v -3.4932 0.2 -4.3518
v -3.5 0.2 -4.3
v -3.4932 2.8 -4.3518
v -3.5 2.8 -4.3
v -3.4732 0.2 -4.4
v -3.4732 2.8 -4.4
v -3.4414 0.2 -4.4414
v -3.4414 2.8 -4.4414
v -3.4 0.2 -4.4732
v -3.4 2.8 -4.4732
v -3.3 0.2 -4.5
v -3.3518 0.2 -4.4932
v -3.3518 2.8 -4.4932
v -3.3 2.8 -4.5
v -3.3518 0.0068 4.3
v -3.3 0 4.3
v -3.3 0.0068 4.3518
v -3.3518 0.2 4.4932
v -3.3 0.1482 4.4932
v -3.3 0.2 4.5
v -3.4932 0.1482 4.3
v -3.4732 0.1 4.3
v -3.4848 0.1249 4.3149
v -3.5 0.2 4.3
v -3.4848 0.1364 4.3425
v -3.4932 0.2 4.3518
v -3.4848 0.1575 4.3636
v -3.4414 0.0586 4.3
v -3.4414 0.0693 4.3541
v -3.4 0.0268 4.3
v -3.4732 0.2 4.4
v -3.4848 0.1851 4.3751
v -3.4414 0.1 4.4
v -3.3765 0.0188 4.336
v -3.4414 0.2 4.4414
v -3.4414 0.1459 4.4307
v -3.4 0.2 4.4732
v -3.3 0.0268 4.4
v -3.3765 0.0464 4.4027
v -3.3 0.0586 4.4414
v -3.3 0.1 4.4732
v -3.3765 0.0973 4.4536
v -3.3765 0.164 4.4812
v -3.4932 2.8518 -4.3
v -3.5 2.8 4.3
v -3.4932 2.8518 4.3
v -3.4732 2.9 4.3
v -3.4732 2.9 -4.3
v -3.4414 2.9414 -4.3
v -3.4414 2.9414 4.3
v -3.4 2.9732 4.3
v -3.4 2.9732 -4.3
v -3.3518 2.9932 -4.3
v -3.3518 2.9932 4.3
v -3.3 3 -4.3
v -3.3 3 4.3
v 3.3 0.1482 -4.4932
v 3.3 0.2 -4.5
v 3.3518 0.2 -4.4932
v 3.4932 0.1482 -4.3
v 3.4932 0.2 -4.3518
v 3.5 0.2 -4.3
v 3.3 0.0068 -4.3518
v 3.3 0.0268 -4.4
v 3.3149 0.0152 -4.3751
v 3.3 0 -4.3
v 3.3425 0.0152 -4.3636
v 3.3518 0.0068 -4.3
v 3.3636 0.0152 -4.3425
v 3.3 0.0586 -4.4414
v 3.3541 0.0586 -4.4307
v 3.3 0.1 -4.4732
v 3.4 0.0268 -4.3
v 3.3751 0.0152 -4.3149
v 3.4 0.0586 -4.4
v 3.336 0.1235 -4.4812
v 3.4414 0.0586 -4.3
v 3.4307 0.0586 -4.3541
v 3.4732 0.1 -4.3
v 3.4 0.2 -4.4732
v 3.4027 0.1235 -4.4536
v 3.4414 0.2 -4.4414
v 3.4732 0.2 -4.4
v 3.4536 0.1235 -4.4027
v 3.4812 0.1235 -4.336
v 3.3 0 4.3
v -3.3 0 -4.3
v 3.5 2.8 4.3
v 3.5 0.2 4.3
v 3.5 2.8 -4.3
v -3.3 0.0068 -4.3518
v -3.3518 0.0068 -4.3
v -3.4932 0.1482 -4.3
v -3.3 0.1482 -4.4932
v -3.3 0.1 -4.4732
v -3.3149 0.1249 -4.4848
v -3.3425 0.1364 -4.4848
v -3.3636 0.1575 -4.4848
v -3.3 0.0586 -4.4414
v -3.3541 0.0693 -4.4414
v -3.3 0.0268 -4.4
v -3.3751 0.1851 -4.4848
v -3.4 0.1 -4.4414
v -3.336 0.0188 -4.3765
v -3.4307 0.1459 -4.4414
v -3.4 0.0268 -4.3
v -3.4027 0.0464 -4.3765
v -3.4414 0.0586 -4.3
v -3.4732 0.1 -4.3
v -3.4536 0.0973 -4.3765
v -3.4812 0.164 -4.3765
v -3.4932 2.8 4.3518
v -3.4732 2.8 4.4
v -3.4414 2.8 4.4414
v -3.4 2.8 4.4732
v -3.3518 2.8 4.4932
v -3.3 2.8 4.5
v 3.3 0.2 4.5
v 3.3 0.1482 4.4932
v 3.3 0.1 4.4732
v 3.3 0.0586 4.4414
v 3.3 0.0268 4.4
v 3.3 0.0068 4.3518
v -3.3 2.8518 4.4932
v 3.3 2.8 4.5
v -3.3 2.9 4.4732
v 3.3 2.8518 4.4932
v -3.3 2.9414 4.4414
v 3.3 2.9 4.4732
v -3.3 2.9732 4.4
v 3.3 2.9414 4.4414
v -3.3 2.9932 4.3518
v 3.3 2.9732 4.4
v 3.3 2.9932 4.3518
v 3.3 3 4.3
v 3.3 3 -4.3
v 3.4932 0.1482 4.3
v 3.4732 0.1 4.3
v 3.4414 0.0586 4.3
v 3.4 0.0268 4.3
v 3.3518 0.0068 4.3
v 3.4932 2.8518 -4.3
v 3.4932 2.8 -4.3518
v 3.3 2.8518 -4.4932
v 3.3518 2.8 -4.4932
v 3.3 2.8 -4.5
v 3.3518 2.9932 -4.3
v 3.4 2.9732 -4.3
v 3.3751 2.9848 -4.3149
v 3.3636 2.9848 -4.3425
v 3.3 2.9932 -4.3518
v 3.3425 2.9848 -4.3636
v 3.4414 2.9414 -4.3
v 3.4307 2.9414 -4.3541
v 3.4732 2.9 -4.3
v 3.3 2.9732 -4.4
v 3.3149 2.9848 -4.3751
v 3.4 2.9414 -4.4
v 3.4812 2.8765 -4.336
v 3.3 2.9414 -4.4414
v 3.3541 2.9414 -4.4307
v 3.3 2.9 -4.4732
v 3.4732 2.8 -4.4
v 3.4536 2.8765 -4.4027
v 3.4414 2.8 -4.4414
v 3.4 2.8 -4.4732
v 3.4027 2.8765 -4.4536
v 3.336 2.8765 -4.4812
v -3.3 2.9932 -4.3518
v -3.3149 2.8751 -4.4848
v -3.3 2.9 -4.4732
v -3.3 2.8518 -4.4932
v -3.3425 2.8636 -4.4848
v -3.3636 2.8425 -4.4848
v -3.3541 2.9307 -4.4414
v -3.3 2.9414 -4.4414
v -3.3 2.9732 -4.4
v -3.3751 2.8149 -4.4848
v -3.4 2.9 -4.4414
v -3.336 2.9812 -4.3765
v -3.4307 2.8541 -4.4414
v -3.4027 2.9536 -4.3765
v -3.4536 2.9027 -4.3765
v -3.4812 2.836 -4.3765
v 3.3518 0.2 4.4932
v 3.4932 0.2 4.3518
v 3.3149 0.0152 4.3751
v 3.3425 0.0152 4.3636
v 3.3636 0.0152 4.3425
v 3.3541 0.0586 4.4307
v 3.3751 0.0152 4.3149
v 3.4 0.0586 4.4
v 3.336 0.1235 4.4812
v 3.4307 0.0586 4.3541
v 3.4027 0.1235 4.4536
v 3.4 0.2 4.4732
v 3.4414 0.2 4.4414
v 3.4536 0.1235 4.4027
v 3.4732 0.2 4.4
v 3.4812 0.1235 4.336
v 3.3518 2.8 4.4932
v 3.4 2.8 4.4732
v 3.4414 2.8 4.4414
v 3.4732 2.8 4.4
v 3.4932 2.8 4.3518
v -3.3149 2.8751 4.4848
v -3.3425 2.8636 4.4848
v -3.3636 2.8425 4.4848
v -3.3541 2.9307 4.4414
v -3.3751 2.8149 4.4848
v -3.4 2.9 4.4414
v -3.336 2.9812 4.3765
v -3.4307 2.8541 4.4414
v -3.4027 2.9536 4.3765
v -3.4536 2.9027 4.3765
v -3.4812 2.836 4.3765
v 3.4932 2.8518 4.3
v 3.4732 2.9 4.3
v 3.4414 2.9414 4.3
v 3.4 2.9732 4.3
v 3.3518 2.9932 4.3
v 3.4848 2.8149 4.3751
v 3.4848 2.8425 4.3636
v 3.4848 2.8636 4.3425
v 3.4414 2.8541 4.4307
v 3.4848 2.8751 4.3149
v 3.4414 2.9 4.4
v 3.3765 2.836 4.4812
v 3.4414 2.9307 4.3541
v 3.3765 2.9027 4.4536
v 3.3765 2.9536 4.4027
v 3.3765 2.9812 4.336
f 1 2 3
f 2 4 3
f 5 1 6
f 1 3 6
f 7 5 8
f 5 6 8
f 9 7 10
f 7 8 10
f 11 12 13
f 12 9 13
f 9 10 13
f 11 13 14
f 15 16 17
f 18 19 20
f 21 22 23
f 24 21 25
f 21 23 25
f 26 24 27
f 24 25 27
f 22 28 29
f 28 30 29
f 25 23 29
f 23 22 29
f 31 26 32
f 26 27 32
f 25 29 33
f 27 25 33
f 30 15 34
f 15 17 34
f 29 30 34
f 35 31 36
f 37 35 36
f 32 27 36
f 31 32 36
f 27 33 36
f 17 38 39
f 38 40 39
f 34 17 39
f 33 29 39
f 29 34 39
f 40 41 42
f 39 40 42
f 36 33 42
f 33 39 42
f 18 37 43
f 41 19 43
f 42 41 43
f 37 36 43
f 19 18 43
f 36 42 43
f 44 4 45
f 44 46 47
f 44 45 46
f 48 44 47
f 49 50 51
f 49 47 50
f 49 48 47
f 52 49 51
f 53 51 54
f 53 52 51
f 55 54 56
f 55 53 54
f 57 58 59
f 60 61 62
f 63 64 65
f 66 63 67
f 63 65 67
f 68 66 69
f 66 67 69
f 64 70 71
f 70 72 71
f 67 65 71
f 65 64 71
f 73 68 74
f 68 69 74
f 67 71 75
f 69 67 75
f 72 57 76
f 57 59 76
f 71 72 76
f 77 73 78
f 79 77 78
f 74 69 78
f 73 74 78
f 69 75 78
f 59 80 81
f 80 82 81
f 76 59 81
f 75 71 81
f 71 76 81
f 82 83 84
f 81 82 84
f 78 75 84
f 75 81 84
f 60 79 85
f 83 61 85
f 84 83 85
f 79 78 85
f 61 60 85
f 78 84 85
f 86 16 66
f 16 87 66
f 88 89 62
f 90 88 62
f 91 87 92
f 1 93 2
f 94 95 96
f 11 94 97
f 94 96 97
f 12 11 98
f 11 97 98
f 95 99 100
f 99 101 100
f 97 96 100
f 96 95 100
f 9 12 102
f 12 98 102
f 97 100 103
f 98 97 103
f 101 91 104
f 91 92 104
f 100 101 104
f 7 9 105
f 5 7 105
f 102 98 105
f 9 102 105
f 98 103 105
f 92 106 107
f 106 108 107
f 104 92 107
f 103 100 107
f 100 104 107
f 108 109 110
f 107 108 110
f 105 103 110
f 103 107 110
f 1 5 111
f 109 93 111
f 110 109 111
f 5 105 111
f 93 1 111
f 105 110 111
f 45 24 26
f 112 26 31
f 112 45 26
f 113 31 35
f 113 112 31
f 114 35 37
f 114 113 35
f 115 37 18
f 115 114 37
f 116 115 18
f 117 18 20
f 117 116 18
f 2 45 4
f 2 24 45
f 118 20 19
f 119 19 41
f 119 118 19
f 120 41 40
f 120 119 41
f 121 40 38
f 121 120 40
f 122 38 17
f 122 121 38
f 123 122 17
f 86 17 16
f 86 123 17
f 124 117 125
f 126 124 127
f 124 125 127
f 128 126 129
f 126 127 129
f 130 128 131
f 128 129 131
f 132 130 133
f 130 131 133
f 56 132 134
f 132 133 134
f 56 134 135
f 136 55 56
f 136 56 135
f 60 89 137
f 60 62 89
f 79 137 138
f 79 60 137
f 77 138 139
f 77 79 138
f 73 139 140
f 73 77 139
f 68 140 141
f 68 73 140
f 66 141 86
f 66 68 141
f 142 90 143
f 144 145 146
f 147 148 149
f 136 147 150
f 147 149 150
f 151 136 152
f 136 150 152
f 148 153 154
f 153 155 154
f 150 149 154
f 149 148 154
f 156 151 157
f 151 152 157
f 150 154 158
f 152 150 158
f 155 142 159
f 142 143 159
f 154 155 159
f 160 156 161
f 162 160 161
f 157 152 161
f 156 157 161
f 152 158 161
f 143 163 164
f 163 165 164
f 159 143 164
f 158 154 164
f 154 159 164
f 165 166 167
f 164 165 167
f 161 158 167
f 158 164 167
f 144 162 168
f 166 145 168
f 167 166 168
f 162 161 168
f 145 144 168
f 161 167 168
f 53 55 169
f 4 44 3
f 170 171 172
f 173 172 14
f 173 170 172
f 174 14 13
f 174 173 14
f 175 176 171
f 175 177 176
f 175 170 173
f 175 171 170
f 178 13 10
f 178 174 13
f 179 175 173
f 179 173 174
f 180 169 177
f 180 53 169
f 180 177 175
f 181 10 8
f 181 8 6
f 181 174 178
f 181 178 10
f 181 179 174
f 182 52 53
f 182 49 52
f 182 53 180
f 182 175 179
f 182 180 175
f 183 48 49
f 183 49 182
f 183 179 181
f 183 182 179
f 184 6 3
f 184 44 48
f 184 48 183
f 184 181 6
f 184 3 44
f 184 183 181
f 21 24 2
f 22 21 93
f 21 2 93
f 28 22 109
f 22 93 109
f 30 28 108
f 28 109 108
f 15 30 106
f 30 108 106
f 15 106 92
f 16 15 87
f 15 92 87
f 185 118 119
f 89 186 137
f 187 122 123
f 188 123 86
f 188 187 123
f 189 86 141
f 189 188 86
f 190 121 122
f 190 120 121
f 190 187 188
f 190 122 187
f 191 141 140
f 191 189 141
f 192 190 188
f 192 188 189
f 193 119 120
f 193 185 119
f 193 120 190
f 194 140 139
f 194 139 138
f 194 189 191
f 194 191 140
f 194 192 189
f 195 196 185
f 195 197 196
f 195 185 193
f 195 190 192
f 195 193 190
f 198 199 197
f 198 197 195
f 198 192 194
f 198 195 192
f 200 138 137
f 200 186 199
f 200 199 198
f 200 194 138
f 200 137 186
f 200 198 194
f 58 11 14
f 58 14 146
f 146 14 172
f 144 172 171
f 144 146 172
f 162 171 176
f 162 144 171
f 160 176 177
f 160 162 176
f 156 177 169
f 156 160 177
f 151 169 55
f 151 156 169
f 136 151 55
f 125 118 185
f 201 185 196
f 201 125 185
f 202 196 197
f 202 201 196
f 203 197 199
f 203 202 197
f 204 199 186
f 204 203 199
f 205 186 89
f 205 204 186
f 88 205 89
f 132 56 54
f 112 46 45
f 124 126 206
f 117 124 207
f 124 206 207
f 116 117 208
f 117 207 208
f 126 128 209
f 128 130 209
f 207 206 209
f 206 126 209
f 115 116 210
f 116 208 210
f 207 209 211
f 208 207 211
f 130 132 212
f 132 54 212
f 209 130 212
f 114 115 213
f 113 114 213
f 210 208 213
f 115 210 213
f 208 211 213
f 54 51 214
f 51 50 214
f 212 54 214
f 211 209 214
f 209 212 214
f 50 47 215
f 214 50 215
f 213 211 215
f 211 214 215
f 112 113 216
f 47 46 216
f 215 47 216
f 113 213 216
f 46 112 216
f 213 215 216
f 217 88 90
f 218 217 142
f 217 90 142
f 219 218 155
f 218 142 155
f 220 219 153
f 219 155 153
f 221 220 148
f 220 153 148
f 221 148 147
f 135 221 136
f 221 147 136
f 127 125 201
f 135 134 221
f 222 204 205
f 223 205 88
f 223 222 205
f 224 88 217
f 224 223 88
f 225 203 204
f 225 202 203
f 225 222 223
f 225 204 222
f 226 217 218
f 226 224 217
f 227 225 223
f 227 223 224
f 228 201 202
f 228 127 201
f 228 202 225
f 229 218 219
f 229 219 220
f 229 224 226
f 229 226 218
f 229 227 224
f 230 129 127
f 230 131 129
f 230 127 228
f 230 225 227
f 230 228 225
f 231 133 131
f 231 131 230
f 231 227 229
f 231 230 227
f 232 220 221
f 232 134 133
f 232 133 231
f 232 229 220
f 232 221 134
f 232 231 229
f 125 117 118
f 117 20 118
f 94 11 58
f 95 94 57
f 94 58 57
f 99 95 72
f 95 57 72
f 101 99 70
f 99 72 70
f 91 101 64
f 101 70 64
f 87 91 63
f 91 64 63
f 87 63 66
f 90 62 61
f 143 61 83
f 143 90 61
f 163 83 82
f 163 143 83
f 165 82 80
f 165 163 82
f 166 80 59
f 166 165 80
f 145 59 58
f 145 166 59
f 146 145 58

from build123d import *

# Parameters (mm, degrees)
SKETCH1_W         = 7
SKETCH1_H         = 9
BOOK_DEPTH        = 3
SMOOTHING_EDGES_R = 0.2


with BuildPart() as part:
    # Sketch1 → Book (new body)
    with BuildSketch(Plane(origin=(0, 0, 0), x_dir=(1, 0, 0), z_dir=(0, 1, 0))):
        Rectangle(SKETCH1_W, SKETCH1_H)
    extrude(amount=BOOK_DEPTH)

    # Smoothing edges
    smoothing_edges_edges = [part.edges().sort_by_distance(p)[0] for p in [
        (-3.5, 3, 0),
        (0, 3, 4.5),
        (3.5, 1.5, -4.5),
        (3.5, 1.5, -4.5),
        (3.5, 1.5, 4.5),
        (3.5, 1.5, 4.5),
        (3.5, 1.5, 4.5),
        (3.5, 1.5, 4.5),
        (3.5, 1.5, -4.5),
        (3.5, 1.5, -4.5),
        (3.5, 3, 0),
        (0, 0, 4.5),
        (-3.5, 0, 0),
        (0, 0, -4.5),
        (3.5, 0, 0),
        (0, 3, -4.5),
        (3.5, 1.5, 4.5),
        (-3.5, 1.5, 4.5),
        (-3.5, 1.5, -4.5),
        (3.5, 1.5, -4.5),
    ]]
    fillet(smoothing_edges_edges, radius=SMOOTHING_EDGES_R)


solid = part.part
